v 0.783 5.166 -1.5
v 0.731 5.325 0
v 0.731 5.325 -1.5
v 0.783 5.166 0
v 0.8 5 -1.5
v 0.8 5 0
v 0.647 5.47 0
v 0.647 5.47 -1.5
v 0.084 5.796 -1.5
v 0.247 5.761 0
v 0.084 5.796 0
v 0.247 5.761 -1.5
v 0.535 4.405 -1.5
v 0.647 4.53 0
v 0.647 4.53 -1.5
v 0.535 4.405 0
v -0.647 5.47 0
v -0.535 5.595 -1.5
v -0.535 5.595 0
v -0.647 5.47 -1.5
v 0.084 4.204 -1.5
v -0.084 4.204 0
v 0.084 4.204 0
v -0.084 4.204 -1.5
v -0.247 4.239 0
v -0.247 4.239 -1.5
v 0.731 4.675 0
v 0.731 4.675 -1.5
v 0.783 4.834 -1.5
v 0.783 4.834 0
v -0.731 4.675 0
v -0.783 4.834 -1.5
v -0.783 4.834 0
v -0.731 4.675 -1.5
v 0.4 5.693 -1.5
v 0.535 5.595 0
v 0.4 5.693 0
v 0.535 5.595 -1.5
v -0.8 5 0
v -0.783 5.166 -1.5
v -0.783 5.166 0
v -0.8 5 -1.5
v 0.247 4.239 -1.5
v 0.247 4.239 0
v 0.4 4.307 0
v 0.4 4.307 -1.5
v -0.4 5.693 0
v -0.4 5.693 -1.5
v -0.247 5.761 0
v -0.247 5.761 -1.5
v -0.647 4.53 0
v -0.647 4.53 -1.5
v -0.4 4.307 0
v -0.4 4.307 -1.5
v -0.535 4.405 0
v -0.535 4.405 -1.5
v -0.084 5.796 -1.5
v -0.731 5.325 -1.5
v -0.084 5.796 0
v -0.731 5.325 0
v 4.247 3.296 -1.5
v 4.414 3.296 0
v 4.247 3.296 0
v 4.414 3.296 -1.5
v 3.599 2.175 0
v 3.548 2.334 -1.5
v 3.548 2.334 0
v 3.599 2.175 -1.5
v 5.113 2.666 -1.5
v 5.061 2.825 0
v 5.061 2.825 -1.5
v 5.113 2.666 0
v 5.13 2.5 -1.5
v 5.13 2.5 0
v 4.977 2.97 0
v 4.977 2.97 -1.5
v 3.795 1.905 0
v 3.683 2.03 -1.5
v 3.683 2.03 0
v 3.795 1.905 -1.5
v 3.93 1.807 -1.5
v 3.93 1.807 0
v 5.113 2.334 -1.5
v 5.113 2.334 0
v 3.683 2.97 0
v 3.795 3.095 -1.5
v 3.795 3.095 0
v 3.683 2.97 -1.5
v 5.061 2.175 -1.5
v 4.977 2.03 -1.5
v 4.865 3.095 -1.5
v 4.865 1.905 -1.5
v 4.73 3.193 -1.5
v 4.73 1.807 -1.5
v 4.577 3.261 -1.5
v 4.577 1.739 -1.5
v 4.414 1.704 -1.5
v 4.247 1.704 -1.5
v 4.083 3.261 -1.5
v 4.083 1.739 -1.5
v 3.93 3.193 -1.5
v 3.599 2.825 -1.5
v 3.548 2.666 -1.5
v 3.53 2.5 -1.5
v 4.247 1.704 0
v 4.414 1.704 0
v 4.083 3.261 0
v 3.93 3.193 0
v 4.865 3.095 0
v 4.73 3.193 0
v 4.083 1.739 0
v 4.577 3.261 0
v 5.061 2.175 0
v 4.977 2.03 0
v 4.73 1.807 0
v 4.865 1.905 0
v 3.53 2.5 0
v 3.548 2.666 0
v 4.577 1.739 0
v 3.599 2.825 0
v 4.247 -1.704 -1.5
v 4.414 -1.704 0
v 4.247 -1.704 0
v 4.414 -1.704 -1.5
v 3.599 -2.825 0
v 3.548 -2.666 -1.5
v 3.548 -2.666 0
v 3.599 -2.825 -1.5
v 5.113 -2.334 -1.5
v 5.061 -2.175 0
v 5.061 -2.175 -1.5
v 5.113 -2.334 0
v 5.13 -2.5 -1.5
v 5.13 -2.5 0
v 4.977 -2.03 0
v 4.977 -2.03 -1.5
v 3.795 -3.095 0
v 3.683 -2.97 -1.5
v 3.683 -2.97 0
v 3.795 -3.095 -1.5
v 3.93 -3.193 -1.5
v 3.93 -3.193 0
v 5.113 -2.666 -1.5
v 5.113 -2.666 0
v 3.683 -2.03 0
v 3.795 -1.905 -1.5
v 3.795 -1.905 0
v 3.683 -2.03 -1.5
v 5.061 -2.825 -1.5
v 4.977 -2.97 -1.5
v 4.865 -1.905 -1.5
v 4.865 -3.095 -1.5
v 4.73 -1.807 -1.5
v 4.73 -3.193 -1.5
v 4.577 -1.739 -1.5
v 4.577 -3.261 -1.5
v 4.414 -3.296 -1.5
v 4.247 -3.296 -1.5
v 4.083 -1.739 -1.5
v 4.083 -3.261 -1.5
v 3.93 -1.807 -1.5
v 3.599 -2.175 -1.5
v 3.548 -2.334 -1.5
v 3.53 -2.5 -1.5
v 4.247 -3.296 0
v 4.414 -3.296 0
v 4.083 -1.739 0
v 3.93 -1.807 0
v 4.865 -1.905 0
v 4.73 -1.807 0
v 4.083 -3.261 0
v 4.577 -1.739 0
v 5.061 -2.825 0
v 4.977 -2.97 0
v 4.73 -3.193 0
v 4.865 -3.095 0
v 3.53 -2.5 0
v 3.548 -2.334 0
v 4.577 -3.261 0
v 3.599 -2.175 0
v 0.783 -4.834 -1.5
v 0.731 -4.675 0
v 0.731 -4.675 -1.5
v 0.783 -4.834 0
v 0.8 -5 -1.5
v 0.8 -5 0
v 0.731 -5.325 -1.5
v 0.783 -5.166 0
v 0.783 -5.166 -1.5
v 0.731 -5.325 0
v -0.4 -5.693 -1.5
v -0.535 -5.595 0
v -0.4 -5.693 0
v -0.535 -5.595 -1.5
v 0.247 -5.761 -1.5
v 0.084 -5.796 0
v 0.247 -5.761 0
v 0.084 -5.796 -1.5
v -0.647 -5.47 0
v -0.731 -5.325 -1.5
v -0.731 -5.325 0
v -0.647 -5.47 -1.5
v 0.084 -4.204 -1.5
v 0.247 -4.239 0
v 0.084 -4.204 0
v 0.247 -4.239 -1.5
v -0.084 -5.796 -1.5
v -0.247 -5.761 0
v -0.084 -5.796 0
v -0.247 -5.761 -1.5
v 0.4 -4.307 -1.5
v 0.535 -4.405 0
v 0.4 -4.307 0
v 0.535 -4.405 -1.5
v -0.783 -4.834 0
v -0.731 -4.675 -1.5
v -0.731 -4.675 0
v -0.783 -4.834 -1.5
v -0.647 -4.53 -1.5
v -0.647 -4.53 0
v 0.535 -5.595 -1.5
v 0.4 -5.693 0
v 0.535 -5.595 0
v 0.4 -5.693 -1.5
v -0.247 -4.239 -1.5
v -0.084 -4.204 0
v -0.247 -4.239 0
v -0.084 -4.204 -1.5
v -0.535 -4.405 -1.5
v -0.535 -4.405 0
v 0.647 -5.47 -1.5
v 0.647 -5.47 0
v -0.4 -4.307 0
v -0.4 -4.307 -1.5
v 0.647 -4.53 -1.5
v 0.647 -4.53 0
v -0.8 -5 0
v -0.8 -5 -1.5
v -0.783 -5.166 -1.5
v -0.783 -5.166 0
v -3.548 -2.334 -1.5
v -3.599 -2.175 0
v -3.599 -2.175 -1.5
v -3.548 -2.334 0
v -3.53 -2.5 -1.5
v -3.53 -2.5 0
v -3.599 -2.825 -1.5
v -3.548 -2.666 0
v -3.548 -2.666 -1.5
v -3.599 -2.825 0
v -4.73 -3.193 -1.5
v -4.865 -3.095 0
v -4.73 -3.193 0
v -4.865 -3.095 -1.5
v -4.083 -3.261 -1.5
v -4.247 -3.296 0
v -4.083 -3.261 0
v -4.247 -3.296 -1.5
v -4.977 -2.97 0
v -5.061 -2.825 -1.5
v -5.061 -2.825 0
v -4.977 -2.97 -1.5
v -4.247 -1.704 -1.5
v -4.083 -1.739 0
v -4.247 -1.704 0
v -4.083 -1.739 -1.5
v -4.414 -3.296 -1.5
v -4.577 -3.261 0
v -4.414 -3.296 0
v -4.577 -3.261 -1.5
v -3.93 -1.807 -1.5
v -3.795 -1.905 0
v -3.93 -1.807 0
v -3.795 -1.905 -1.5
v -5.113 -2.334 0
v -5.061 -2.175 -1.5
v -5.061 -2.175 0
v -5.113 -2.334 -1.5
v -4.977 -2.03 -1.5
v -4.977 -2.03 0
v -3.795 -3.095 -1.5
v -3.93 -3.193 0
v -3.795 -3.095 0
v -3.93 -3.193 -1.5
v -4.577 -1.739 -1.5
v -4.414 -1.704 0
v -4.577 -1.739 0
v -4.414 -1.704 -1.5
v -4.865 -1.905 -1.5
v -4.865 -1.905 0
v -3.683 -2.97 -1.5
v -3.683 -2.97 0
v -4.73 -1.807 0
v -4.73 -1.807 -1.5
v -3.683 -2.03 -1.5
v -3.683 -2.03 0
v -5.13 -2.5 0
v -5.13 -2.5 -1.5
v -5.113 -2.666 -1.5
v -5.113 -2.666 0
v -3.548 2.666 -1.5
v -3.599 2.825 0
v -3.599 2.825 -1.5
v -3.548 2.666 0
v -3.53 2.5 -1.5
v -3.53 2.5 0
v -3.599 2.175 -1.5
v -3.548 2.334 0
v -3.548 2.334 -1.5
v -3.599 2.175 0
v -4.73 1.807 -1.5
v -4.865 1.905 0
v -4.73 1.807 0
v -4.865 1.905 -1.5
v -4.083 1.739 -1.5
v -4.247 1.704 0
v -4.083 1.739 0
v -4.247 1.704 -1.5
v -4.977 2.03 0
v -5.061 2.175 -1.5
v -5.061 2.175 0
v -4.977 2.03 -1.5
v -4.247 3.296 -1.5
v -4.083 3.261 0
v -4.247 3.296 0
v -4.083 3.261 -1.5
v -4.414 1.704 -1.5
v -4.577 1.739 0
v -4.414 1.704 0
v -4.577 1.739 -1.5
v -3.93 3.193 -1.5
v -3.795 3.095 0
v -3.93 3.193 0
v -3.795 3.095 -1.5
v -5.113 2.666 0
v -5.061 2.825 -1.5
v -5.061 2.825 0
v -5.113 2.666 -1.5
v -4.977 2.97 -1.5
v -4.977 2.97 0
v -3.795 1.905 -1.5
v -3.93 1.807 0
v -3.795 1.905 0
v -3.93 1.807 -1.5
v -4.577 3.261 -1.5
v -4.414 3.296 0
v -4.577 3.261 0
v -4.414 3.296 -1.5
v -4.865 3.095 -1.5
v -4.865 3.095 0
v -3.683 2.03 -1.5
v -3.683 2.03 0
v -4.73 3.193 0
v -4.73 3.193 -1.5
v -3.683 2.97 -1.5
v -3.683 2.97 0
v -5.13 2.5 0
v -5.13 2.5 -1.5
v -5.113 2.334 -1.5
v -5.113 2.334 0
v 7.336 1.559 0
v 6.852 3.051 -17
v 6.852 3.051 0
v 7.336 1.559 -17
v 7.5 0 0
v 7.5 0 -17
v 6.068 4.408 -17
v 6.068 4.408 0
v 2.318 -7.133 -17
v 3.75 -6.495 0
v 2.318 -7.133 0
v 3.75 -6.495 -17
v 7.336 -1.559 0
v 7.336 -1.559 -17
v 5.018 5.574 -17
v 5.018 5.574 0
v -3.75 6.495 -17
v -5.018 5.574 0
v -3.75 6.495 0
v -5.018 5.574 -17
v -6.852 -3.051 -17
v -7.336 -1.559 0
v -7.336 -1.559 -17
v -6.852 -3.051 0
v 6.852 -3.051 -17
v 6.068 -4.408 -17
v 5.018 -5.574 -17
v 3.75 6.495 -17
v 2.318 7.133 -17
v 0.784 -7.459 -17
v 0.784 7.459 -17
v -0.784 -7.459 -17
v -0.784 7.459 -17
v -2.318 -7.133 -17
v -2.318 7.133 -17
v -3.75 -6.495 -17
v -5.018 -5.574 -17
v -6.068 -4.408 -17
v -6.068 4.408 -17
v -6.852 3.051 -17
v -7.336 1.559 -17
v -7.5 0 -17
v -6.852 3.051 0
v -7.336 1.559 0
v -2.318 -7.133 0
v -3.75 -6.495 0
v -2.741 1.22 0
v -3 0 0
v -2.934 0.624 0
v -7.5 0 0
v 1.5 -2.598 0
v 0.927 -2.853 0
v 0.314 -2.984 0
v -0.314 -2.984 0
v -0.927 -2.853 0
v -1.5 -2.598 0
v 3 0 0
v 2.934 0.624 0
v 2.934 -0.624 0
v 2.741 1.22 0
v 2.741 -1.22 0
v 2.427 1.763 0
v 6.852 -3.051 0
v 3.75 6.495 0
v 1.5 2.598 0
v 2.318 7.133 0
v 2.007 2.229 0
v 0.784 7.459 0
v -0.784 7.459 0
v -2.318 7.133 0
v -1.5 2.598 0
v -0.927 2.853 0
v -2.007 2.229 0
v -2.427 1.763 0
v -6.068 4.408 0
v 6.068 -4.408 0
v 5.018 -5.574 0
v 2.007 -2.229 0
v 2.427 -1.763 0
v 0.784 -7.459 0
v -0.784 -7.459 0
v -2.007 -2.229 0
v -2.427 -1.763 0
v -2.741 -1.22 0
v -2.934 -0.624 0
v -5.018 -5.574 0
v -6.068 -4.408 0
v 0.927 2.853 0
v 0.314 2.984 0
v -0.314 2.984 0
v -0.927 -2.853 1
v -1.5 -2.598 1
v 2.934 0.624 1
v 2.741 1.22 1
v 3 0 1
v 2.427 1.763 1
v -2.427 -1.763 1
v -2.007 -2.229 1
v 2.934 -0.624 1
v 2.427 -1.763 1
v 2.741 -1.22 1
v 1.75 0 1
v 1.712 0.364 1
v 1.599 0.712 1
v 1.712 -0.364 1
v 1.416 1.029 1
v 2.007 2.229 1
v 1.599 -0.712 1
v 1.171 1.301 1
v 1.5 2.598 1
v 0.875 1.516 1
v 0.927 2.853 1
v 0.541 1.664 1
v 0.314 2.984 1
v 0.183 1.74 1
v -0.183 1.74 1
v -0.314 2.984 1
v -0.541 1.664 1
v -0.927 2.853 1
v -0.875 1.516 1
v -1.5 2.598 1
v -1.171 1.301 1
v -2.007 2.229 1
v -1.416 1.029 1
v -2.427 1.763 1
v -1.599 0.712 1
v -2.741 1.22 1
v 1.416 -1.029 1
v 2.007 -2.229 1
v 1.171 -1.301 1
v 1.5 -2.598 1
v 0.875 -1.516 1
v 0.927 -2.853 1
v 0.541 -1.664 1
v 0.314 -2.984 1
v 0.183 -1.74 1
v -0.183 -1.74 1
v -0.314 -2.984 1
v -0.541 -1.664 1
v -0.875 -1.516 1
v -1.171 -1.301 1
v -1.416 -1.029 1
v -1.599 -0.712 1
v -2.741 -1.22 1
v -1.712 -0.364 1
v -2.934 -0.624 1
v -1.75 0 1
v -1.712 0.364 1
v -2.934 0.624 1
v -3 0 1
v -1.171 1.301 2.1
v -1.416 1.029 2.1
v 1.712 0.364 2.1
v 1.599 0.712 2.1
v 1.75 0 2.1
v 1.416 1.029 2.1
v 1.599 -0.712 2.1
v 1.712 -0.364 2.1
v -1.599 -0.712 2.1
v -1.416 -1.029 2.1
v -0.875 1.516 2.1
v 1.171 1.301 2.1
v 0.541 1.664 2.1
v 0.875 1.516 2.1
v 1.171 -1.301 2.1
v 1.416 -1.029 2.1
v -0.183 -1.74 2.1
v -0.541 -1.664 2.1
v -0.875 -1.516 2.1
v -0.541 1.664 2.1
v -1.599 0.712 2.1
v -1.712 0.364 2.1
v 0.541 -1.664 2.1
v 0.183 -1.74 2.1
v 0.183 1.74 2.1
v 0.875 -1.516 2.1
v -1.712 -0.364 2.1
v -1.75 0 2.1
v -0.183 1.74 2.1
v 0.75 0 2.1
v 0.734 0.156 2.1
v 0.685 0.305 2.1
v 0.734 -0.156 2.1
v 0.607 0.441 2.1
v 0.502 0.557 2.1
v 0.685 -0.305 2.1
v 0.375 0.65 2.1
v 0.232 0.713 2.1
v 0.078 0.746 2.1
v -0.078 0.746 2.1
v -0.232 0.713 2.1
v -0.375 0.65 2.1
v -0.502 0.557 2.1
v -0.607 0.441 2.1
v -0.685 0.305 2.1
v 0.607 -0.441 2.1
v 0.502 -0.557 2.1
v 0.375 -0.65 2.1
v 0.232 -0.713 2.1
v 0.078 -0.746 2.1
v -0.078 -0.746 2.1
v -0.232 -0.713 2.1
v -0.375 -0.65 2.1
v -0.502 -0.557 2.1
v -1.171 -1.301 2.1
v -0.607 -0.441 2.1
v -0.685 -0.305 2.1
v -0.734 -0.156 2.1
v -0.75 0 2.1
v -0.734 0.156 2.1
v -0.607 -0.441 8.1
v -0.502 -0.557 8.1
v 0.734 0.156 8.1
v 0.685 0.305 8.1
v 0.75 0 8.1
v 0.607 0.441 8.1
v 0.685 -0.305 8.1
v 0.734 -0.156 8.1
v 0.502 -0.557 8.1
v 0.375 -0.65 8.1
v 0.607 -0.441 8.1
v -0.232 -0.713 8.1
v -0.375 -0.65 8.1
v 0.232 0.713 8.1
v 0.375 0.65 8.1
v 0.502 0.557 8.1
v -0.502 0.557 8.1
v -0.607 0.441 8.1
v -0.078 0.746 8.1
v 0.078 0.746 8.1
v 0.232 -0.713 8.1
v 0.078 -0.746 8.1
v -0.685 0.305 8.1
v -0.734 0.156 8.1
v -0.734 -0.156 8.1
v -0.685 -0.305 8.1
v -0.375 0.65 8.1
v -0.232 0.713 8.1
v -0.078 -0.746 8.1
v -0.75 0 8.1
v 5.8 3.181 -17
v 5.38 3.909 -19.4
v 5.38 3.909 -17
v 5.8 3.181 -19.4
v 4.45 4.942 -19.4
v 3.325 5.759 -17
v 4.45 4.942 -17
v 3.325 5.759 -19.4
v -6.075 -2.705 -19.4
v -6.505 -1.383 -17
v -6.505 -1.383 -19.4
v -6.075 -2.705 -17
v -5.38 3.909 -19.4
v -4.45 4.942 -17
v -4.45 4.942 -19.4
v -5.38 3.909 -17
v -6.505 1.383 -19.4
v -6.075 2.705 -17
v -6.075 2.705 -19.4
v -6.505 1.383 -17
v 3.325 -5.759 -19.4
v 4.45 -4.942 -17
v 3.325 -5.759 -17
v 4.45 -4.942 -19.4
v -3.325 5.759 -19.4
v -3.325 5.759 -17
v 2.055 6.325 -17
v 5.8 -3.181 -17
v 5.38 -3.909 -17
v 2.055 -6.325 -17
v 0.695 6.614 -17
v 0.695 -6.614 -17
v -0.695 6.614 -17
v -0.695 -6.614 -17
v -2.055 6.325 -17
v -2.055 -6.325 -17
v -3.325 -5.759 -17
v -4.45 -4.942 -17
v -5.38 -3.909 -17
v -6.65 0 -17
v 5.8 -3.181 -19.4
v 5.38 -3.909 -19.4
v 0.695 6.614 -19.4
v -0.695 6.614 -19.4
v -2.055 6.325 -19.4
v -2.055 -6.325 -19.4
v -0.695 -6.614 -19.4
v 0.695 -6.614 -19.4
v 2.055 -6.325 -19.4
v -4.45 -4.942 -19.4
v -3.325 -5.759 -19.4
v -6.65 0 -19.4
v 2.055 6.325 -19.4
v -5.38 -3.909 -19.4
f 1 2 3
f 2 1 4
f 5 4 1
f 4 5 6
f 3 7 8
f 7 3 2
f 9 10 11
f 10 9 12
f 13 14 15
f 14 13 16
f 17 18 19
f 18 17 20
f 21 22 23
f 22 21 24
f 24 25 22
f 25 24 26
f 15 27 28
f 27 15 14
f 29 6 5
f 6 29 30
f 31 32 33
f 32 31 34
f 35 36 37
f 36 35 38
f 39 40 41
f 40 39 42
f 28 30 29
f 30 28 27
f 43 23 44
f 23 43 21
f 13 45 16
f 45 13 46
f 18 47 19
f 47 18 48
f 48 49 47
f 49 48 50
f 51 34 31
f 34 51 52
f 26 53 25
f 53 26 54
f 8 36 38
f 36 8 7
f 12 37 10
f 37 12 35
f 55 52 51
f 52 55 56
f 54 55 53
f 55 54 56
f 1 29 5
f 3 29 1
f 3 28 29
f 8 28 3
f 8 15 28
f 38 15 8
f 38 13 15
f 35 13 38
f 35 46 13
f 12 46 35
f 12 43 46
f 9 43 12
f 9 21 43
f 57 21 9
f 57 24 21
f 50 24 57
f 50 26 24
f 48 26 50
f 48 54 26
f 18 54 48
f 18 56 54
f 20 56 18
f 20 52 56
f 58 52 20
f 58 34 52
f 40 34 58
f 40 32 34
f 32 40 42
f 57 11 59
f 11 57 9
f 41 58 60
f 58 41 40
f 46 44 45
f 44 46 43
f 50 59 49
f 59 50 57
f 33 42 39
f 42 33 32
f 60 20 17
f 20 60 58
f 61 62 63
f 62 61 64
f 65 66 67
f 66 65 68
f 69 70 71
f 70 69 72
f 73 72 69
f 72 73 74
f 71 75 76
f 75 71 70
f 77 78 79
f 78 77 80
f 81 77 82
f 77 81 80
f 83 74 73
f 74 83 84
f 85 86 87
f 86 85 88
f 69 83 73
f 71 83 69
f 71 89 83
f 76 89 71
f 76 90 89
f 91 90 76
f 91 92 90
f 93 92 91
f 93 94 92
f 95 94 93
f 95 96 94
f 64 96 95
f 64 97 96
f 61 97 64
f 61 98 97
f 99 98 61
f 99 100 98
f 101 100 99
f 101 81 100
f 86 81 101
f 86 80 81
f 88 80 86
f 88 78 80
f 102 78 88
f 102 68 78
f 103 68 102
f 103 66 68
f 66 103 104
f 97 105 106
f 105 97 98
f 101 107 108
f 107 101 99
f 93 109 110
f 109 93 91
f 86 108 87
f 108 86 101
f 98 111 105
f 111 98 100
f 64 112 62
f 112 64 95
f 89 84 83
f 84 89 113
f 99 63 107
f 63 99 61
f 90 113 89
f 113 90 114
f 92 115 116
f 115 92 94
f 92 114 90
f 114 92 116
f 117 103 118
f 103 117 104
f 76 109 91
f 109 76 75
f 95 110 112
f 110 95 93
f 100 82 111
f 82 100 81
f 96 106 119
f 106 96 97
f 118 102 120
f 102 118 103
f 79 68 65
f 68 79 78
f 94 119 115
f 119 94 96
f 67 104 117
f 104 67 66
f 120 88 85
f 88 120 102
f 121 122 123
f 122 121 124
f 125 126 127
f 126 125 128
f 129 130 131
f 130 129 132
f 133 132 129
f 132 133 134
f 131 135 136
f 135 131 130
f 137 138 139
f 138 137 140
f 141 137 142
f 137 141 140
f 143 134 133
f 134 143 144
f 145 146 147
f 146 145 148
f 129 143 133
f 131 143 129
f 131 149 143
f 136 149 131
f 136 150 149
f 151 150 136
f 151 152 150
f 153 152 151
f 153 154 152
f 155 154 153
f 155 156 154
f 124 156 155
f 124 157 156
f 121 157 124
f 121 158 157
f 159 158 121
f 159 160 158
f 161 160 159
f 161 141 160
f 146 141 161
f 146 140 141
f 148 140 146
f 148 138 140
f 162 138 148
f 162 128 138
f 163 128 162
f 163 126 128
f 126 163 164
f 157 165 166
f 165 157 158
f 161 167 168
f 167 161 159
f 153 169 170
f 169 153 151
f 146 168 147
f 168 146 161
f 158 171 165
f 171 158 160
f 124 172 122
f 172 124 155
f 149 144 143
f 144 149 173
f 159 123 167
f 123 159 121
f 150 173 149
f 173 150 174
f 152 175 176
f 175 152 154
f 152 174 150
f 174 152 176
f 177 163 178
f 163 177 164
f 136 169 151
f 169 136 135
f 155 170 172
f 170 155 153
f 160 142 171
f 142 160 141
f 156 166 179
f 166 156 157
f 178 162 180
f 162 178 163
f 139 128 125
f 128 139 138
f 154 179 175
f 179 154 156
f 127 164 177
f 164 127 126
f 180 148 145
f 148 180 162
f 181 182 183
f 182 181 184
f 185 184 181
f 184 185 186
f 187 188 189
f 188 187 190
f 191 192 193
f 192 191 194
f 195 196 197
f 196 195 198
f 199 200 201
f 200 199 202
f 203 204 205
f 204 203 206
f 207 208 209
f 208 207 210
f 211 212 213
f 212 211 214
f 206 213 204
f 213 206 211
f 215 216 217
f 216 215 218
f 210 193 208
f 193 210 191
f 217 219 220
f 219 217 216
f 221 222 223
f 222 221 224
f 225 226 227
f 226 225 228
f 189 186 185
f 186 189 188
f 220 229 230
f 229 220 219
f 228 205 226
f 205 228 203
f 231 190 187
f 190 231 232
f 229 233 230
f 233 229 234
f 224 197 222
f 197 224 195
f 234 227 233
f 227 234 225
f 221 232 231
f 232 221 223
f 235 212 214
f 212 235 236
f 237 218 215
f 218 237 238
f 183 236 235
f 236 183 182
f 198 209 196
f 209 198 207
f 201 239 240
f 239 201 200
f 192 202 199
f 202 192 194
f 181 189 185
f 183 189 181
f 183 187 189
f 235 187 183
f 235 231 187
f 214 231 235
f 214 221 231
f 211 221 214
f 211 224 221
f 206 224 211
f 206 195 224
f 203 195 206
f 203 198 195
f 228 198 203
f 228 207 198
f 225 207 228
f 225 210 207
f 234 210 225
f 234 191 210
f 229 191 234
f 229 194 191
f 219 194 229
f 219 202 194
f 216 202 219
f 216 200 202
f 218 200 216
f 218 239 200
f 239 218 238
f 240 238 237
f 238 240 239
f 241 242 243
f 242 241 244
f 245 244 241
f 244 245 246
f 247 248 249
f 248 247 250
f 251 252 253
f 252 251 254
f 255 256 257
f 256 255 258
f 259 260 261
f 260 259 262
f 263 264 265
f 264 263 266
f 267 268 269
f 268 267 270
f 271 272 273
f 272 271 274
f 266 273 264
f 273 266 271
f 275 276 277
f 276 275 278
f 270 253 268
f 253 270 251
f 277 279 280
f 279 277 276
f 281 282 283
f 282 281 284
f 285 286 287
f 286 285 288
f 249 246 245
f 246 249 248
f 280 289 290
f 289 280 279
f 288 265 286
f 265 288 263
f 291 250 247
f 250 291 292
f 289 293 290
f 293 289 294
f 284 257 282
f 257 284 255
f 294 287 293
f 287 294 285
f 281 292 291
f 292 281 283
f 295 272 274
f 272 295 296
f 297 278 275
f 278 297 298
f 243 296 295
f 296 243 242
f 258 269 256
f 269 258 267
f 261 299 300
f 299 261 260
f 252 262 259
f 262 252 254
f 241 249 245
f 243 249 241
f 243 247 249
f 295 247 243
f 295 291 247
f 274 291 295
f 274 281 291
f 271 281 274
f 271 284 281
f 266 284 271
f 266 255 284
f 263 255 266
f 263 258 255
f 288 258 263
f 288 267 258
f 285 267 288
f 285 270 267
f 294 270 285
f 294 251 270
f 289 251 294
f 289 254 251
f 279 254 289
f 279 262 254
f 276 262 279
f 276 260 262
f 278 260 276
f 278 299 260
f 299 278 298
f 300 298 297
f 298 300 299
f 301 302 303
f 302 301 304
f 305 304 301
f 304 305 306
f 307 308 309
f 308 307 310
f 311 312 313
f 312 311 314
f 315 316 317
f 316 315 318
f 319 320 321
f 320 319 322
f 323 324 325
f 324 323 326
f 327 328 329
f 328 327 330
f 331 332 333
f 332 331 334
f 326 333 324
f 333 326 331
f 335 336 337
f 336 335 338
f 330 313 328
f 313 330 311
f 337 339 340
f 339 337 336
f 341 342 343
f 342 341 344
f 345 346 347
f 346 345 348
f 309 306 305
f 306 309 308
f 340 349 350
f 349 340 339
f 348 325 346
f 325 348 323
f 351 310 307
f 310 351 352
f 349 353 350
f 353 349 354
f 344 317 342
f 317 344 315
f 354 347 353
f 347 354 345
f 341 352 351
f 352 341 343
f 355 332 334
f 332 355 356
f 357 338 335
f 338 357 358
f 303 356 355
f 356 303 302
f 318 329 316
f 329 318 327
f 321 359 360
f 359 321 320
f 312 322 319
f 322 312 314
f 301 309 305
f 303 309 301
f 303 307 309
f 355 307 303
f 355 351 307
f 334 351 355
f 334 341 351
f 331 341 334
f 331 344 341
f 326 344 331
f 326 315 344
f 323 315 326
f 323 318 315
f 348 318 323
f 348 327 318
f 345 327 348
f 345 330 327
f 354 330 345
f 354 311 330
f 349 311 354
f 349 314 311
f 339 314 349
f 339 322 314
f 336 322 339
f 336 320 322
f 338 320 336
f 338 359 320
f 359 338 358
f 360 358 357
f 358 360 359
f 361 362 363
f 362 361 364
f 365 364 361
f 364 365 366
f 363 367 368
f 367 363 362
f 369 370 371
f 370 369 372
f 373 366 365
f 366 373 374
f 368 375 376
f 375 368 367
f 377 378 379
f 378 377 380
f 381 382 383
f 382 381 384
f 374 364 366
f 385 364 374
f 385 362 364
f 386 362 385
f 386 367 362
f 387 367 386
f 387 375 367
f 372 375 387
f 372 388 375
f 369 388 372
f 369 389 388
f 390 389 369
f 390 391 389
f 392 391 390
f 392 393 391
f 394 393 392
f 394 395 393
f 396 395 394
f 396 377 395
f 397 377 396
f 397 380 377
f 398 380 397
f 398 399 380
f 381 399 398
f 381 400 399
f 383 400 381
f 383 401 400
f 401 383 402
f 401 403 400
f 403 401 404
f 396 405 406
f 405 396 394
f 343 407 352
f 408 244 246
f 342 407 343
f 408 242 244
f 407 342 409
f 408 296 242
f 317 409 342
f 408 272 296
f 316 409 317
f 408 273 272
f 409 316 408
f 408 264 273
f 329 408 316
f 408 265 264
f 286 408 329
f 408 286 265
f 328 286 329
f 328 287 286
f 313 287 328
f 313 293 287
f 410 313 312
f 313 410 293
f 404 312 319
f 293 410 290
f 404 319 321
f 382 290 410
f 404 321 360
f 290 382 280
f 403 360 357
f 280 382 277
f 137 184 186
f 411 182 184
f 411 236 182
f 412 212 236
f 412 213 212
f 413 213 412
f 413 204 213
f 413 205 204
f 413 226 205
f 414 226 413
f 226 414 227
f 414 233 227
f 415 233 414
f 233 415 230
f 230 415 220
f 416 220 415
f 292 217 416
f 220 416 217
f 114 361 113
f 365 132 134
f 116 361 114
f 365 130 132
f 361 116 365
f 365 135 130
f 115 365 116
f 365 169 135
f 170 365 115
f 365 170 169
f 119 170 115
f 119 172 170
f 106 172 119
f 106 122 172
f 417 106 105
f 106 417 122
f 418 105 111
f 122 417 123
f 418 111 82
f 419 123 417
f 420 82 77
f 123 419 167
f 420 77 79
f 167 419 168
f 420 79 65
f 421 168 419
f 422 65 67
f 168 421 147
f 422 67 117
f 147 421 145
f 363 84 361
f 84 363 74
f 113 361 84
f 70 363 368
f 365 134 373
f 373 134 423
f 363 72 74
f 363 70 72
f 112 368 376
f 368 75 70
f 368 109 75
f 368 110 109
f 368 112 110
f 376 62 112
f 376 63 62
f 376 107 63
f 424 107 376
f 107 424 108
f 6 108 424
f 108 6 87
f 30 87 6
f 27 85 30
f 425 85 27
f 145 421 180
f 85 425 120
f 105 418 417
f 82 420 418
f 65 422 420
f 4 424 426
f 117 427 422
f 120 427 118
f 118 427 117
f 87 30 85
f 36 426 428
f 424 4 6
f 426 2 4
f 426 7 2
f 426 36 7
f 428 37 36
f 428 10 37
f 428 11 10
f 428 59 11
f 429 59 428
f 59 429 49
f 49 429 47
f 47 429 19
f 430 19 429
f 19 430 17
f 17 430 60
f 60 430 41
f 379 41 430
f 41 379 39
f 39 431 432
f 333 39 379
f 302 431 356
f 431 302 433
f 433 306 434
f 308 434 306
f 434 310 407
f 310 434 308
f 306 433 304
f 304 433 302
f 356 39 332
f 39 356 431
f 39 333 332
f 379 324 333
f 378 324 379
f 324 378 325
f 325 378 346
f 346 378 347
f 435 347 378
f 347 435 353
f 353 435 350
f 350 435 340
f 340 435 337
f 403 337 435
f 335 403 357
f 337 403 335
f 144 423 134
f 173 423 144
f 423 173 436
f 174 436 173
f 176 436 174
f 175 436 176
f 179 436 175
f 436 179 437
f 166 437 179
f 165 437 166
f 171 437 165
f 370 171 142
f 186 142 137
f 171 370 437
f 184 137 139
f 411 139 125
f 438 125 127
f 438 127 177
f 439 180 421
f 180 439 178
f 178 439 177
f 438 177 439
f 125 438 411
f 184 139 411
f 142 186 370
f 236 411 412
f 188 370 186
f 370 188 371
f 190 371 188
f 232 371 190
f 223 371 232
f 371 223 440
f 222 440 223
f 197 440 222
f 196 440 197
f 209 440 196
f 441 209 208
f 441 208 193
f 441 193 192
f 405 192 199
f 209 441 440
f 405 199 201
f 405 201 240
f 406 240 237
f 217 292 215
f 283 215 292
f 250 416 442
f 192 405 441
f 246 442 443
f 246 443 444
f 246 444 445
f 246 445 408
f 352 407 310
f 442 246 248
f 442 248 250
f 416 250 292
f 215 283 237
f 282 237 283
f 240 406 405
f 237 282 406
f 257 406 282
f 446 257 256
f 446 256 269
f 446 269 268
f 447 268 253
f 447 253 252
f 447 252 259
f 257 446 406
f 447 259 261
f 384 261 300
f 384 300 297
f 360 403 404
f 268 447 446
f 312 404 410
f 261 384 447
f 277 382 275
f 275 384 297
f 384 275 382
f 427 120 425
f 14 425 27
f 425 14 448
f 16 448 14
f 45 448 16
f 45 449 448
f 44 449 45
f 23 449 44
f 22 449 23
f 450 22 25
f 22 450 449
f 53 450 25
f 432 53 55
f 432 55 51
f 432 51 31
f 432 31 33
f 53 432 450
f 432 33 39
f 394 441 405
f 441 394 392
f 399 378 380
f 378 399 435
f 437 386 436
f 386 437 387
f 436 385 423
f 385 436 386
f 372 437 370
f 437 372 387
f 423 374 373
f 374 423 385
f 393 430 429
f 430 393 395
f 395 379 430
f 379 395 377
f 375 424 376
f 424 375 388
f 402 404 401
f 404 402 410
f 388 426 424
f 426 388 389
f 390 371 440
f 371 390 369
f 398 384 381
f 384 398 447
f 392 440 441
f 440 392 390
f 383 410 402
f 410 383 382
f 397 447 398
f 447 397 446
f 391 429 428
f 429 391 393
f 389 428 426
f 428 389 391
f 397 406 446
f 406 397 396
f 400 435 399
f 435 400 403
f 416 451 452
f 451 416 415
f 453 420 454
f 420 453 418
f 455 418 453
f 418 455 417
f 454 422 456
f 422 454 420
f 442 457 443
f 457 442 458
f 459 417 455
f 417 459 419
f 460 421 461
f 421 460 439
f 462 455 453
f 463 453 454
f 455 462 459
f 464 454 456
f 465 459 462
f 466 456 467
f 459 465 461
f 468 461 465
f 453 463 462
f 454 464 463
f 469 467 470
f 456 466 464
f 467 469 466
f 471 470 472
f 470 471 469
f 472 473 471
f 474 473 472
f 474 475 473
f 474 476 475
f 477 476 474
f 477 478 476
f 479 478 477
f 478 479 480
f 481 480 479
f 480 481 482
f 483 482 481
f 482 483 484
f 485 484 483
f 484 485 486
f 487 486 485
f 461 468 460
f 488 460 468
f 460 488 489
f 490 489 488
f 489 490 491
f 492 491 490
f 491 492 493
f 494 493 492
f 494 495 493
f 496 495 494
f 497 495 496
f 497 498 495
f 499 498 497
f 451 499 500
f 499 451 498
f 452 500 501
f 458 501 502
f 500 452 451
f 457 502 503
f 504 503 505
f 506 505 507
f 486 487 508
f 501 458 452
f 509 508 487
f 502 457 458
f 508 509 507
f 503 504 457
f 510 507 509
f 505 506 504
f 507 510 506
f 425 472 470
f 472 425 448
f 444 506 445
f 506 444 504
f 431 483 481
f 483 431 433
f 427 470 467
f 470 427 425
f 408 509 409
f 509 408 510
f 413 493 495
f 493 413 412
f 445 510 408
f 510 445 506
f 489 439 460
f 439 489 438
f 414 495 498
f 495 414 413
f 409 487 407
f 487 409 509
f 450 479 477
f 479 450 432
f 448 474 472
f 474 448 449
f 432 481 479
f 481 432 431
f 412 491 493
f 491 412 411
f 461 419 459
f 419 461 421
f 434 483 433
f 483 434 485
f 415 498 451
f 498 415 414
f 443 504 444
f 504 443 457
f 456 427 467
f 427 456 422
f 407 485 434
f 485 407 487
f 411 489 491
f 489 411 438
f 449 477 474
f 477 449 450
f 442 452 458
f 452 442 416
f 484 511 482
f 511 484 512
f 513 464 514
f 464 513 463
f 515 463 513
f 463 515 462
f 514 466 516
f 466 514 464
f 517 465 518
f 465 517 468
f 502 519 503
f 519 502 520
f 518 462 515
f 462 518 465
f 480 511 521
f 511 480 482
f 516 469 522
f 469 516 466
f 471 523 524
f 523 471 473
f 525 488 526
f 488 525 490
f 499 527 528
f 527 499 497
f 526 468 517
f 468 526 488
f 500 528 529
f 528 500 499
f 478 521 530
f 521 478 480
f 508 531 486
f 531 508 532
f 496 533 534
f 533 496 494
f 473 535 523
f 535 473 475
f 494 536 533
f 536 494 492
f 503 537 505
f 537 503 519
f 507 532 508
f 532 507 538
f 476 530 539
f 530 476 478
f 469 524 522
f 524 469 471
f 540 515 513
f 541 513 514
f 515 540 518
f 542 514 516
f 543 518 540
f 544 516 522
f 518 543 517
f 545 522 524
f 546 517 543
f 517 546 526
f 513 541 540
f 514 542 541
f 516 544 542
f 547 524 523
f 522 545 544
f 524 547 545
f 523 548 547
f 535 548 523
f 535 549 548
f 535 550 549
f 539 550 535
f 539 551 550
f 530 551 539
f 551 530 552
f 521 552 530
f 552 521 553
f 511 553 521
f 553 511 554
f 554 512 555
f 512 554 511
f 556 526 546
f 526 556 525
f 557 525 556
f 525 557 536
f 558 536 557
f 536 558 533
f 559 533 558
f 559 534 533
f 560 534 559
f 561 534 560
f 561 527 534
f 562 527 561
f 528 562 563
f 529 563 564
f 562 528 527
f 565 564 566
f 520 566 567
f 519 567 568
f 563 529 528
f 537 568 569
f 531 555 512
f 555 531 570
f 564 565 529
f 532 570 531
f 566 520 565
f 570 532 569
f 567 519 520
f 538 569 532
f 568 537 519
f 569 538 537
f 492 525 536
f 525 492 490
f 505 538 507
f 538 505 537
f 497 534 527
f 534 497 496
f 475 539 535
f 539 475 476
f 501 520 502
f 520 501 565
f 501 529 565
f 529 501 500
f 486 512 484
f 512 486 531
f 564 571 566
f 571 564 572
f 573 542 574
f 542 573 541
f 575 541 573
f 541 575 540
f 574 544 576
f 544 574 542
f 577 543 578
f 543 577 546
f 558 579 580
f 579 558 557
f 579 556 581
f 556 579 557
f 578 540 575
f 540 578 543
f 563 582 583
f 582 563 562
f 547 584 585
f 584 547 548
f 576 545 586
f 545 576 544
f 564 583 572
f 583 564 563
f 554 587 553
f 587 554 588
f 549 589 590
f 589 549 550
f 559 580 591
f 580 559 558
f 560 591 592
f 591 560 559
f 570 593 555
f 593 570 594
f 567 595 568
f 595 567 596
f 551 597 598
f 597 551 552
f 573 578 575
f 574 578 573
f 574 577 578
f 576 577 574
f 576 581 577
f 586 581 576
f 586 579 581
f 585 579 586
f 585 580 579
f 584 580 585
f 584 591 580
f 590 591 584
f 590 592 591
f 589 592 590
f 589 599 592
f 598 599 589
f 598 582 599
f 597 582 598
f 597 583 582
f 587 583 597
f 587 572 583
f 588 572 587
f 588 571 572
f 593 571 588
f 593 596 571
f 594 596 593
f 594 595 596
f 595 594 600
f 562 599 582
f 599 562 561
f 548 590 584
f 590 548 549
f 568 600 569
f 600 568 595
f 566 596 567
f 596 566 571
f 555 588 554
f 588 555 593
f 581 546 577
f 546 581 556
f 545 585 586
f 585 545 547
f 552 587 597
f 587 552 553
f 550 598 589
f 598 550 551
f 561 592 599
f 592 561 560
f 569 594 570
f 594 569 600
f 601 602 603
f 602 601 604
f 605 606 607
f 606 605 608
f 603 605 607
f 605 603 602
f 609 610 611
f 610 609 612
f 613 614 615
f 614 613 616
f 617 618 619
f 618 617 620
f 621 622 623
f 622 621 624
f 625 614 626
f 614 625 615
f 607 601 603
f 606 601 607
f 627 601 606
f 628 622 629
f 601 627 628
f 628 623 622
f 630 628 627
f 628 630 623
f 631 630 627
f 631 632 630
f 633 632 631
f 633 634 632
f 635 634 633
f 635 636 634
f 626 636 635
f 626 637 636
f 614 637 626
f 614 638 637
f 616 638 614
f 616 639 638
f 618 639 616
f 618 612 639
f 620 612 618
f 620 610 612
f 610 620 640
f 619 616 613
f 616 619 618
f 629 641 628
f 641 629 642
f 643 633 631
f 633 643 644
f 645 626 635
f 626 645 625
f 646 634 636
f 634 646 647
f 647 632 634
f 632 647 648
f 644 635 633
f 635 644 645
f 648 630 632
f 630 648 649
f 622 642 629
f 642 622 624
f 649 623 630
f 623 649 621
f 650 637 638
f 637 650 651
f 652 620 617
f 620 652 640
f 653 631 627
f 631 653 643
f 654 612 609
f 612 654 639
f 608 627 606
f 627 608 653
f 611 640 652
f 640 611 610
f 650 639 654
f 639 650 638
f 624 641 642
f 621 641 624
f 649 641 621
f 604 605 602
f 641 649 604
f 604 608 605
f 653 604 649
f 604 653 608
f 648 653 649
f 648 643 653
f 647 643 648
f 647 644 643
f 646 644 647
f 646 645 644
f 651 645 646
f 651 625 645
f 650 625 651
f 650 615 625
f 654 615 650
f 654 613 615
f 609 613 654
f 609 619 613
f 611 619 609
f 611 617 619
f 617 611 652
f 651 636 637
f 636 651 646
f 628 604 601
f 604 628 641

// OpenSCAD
//motor 1717 modeling
//encoder
//https://www.shinkoh-faulhaber.jp/JP_data_edition_2020/JP_IEH2-4096_DFF.pdf
//https://www.shinkoh-faulhaber.jp/products/series/1717sr
//Author Y.Nakagawa
//Date: 2024/12/07

motor1717();
module motor1717(){
    translate([0,0,-17]) motor1717_body();
    color("black")translate([0,0,-17-2.4])motor1717_encoder();
}

module motor1717_old(){
el=2.4; //encoder height with encoder 19.4(mm)

    translate([0,0,el]) motor1717_body();
    color("black")motor1717_encoder();
}

module motor1717_screwhole(hscrew, rscrew, rcircle, bheight){
    for(angle=[0:60:360]){
        translate([rcircle*sin(angle),rcircle*cos(angle),bheight])
            cylinder(h=hscrew, r=rscrew);
    }
}

module motor1717_body(){
$fs=0.01;
fl = 17;//17; //faulharber1717 17length
fr = (15/2);
sl = 1.6; //screw length 1.6(mm)
sr = 0.8; //screw hole 0.3(mm)
a1r=3; //axis sholder base 1 6mm diameter
a2r=1.75; //axis sholder base 2 3.5mm diameter
a1h=1; //height is measured from body
a2h=2.1; //height is from body
ar=1.5;//axis diameter 1.5mm
ah=8.1;//height is measured from body
    
  
difference(){
    color("black") cylinder(h=fl, r=fr);
    motor1717_screwhole(sl, sr, 5, fl-sl+0.1);
}

translate([0,0, fl])
    cylinder(h=a1h, r=a1r);
translate([0,0,fl])
    cylinder(h=a2h, r=a2r);
translate([0,0,fl])
    color("silver")
    cylinder(h=ah, r=ar/2);
}

module motor1717_encoder(){
$fs=0.01;
el=2.4; //encoder height with encoder 19.4(mm)
er=(13.3/2);
    difference(){
        cylinder(h=el, r=er);
        translate([5.8, -10,-3])
        cube([17,20,el+5]);
    }
}


//color("red") screwhole(sl, sr, 5, fl-sl+0.1);
